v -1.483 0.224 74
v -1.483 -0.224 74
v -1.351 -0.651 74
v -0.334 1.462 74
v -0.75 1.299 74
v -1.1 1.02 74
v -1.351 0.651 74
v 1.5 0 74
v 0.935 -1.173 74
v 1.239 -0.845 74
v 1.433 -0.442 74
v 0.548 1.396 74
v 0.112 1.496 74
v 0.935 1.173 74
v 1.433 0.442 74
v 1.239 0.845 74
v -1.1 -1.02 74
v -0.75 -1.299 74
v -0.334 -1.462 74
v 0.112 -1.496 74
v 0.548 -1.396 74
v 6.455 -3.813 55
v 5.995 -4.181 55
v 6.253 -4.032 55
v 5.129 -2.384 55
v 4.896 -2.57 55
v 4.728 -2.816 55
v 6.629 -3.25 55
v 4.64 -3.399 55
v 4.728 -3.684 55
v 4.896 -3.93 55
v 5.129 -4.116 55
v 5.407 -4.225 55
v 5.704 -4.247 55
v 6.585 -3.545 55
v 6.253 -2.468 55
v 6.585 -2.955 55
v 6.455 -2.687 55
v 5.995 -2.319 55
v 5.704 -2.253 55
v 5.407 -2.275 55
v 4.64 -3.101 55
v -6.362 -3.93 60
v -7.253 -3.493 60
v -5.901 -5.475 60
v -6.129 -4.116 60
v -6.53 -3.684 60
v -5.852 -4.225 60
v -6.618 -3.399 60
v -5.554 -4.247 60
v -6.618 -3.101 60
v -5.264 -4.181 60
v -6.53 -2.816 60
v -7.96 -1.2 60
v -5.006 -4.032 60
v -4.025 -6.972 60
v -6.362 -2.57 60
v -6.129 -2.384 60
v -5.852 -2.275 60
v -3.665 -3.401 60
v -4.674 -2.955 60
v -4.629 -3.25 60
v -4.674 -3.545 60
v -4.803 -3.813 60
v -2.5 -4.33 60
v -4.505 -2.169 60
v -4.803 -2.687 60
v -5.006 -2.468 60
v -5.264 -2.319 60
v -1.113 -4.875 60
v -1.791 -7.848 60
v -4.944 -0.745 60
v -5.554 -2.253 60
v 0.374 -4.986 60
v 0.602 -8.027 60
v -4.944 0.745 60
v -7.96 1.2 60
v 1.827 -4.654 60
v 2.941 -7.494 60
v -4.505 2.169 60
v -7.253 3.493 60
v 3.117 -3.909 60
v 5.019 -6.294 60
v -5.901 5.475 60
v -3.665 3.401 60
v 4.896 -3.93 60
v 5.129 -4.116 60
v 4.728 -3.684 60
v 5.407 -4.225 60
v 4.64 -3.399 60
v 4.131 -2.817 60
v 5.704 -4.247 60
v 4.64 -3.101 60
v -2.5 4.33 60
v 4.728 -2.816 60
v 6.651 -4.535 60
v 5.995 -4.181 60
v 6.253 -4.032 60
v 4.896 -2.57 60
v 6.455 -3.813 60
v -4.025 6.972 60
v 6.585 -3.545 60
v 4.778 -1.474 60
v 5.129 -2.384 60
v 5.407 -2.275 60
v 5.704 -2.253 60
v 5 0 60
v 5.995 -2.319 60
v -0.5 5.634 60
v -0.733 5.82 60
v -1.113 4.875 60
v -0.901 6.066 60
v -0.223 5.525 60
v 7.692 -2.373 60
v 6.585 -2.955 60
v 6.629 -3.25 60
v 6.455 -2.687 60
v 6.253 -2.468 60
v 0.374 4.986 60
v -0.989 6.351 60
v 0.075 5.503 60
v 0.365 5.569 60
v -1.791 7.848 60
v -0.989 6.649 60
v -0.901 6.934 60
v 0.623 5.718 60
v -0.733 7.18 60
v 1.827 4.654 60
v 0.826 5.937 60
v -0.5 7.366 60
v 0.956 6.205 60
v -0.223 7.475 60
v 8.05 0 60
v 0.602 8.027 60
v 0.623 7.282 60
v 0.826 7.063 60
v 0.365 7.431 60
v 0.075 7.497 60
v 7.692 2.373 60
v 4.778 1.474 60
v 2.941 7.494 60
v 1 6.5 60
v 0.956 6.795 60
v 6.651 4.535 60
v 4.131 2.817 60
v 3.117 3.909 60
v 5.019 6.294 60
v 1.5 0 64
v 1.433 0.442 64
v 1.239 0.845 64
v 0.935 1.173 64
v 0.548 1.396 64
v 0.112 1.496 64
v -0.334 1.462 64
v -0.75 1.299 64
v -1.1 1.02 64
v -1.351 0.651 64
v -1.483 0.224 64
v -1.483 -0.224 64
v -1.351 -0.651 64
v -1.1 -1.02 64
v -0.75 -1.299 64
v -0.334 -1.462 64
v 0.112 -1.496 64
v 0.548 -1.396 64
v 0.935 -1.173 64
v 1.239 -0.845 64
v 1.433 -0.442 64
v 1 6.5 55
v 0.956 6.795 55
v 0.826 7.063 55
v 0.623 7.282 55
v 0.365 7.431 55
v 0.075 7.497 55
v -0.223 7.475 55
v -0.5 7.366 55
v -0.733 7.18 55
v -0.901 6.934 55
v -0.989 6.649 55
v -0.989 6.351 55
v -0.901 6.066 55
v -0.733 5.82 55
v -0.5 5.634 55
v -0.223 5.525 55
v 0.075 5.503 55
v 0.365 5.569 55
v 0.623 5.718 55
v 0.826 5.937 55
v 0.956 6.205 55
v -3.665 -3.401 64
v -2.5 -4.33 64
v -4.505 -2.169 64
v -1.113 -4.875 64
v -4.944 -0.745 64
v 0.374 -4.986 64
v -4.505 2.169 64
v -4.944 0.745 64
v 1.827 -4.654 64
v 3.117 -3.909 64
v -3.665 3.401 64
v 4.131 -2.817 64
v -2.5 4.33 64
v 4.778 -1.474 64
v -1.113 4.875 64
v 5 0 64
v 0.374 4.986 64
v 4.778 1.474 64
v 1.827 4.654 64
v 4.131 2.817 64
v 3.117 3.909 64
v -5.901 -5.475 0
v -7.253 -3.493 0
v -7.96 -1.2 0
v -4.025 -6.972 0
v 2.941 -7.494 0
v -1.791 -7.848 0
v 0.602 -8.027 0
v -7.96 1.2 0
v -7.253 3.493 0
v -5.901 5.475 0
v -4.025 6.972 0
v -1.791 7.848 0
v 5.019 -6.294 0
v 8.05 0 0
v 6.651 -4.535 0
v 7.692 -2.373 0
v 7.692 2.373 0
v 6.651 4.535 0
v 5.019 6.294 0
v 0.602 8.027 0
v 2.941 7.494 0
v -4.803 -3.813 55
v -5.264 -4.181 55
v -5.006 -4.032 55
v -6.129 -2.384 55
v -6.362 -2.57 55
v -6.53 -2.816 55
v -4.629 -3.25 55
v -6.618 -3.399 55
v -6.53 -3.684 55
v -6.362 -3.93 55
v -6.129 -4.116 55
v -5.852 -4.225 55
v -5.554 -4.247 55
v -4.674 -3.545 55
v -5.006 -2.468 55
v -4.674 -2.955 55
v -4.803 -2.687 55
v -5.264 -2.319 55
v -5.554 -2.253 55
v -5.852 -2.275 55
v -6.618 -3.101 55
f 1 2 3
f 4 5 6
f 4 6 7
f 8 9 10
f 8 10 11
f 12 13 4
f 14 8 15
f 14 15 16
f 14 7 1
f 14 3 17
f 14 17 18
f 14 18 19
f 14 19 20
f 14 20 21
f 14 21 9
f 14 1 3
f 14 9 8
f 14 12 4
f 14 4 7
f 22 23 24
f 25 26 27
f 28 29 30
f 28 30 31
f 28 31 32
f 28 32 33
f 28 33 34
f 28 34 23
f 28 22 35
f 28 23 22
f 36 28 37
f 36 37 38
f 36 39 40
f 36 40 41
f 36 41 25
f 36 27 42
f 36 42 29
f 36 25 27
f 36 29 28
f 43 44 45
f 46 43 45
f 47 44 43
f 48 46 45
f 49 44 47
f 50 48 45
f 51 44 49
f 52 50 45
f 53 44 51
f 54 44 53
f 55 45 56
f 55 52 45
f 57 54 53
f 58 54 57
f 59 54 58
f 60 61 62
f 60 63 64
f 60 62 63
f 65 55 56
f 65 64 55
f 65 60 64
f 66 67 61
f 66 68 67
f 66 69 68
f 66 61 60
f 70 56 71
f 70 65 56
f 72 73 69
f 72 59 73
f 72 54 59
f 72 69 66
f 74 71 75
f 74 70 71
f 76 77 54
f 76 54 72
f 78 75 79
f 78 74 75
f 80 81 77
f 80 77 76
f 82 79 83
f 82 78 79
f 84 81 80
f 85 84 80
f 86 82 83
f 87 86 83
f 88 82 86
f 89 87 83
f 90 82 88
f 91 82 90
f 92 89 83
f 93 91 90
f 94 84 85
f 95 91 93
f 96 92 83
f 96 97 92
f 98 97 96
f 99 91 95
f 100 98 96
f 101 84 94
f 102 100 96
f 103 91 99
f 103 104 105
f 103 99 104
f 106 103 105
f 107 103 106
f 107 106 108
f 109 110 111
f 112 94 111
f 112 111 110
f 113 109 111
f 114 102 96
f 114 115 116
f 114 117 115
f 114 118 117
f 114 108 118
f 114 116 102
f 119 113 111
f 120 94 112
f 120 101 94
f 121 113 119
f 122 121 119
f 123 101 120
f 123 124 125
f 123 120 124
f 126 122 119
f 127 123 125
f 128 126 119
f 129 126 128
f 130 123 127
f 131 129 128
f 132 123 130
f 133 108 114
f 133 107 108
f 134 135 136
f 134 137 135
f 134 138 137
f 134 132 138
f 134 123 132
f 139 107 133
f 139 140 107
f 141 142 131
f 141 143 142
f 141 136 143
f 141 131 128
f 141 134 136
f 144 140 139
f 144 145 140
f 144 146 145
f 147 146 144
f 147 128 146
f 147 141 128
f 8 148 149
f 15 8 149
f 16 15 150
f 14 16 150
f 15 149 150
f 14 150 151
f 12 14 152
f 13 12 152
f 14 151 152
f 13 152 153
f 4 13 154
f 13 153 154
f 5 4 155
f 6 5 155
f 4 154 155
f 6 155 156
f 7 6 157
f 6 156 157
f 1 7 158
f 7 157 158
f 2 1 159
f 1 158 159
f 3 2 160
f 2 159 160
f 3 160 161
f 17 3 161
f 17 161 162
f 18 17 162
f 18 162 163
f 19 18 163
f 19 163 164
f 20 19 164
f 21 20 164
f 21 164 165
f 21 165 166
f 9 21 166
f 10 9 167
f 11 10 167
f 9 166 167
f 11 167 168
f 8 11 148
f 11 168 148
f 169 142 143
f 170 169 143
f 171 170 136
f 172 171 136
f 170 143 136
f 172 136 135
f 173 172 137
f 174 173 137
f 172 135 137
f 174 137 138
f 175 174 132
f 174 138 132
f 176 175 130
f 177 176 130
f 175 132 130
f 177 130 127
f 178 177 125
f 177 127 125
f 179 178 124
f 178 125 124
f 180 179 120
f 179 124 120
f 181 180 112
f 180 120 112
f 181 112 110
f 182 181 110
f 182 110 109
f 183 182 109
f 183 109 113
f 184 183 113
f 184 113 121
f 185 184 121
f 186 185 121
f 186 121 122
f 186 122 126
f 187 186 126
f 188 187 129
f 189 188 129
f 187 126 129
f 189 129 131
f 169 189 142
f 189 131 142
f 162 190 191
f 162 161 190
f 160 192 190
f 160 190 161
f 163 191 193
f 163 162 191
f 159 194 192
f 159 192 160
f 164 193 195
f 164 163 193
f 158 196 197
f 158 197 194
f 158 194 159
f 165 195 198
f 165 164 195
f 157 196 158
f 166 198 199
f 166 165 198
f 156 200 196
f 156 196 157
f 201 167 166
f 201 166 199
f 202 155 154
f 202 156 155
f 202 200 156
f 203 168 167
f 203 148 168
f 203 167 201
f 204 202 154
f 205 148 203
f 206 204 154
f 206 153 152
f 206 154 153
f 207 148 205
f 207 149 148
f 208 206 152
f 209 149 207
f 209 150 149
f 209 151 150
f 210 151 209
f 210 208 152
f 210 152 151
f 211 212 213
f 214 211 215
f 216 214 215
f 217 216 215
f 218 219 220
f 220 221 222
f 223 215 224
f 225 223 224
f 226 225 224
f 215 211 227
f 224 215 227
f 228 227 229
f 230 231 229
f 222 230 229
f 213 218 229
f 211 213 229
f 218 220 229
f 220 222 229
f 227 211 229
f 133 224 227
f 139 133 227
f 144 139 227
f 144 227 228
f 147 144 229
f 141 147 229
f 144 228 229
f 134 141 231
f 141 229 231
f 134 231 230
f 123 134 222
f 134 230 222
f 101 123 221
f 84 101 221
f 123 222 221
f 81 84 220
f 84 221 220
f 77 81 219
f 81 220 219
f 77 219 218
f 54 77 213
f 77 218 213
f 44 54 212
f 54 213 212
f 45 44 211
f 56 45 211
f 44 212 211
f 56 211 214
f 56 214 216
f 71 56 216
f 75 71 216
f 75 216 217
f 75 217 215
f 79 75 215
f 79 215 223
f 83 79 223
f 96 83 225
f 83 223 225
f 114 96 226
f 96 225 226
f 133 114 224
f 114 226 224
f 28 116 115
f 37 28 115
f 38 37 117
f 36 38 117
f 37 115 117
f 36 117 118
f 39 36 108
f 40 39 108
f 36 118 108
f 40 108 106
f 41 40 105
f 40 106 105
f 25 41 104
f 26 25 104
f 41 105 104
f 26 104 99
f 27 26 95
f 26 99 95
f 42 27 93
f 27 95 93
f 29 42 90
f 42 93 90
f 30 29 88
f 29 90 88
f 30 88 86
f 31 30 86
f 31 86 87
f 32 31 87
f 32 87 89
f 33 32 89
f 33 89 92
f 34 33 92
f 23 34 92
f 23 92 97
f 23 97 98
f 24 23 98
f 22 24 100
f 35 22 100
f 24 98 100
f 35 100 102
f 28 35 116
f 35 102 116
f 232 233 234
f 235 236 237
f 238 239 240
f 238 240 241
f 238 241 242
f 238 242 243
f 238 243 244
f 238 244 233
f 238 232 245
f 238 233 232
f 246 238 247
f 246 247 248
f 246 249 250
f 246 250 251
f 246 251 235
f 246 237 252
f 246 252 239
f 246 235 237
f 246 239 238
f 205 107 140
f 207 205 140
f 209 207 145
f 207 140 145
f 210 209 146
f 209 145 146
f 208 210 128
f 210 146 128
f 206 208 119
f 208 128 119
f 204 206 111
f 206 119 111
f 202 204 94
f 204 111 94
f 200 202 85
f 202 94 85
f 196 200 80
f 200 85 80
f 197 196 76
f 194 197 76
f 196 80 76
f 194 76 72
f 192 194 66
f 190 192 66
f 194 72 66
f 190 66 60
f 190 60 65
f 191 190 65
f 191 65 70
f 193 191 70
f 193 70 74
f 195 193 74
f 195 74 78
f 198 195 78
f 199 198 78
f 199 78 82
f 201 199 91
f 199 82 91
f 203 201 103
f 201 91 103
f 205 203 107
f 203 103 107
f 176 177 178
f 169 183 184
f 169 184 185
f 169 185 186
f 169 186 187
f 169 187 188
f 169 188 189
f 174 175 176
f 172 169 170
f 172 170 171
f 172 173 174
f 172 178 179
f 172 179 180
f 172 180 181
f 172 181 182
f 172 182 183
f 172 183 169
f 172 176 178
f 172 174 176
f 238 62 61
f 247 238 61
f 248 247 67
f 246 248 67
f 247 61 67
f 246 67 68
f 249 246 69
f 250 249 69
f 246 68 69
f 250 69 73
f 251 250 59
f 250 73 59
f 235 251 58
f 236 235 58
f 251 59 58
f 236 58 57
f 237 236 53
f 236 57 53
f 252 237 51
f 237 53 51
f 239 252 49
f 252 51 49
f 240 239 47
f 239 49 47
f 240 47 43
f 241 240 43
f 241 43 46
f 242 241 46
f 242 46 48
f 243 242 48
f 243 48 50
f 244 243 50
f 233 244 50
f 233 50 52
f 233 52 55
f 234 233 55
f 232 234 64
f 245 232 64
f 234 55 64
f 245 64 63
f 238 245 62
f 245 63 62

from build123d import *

# Parameters (mm, degrees)
SKETCH1_R           = 8.05
BOSS_EXTRUDE1_DEPTH = 60
SKETCH2_R           = 5
BOSS_EXTRUDE2_DEPTH = 4
SKETCH3_R           = 1
CUT_EXTRUDE1_DEPTH  = 5
SKETCH4_R           = 1.5
BOSS_EXTRUDE3_DEPTH = 10


with BuildPart() as part:
    # Sketch1 → Boss-Extrude1 (new body)
    with BuildSketch(Plane.XY):
        Circle(SKETCH1_R)
    extrude(amount=BOSS_EXTRUDE1_DEPTH)

    # Sketch2 → Boss-Extrude2 (add)
    with BuildSketch(Plane.XY.offset(60)):
        Circle(SKETCH2_R)
    extrude(amount=BOSS_EXTRUDE2_DEPTH)

    # Sketch3 → Cut-Extrude1 (cut)
    with BuildSketch(Plane.XY.offset(60)):
        with Locations((0, 6.5)):
            Circle(SKETCH3_R)
        with Locations((5.629165125, -3.25)):
            Circle(SKETCH3_R)
        with Locations((-5.629165125, -3.25)):
            Circle(SKETCH3_R)
    extrude(amount=-CUT_EXTRUDE1_DEPTH, mode=Mode.SUBTRACT)

    # Sketch4 → Boss-Extrude3 (add)
    with BuildSketch(Plane.XY.offset(64)):
        Circle(SKETCH4_R)
    extrude(amount=BOSS_EXTRUDE3_DEPTH)


solid = part.part
